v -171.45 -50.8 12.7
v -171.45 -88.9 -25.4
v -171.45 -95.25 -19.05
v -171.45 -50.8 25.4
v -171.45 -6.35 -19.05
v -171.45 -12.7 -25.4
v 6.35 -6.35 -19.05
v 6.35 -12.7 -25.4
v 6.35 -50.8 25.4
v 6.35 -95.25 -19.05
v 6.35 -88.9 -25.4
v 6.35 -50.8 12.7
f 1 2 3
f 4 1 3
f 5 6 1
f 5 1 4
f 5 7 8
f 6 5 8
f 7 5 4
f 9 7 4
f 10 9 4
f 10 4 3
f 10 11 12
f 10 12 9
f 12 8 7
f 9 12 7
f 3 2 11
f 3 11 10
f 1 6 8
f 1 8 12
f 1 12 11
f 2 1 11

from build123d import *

# Parameters (mm, degrees)
F0_W     = 12.7
F0_H     = 50.8
F1_DEPTH = 101.6
F3_DEPTH = 12.701
F4_DEPTH = 165.1
F6_DEPTH = 177.801
F8_DEPTH = 177.801


with BuildPart() as f1:
    # F0 (on Front) → F1 (new body)
    with BuildSketch(Plane.XZ):
        Rectangle(F0_W, F0_H)
    extrude(amount=F1_DEPTH)

    # F2 (on face) → F3 (cut, through all)
    with BuildSketch(Plane.YZ.offset(6.35)):
        Polygon((-101.6, 25.4), (-101.6, -25.4), (-50.8, 25.4), align=None)
        Polygon((0, 25.4), (-50.8, 25.4), (0, -25.4), align=None)
    extrude(amount=-F3_DEPTH, mode=Mode.SUBTRACT)

    # F4 (add): a face of the model
    f4_faces = [f1.faces().sort_by_distance(p)[0] for p in [
        (-6.35, -50.8, -8.4666666667),
    ]]
    extrude(f4_faces, amount=F4_DEPTH)

    # F5 (on face) → F6 (cut, through all)
    with BuildSketch(Plane.YZ.offset(6.35)):
        Polygon((-50.7999999233, 12.7000000767), (-88.9, -25.4), (-12.6999998465, -25.4), align=None)
    extrude(amount=-F6_DEPTH, mode=Mode.SUBTRACT)

    # F7 (on face) → F8 (cut, through all)
    with BuildSketch(Plane.YZ.offset(6.35)):
        Polygon((-6.3499999233, -19.0500000767), (-12.6999998465, -25.4), (0, -25.4), align=None)
        Polygon((-101.6, -25.4), (-88.9, -25.4), (-95.25, -19.05), align=None)
    extrude(amount=-F8_DEPTH, mode=Mode.SUBTRACT)


solid = f1.part
